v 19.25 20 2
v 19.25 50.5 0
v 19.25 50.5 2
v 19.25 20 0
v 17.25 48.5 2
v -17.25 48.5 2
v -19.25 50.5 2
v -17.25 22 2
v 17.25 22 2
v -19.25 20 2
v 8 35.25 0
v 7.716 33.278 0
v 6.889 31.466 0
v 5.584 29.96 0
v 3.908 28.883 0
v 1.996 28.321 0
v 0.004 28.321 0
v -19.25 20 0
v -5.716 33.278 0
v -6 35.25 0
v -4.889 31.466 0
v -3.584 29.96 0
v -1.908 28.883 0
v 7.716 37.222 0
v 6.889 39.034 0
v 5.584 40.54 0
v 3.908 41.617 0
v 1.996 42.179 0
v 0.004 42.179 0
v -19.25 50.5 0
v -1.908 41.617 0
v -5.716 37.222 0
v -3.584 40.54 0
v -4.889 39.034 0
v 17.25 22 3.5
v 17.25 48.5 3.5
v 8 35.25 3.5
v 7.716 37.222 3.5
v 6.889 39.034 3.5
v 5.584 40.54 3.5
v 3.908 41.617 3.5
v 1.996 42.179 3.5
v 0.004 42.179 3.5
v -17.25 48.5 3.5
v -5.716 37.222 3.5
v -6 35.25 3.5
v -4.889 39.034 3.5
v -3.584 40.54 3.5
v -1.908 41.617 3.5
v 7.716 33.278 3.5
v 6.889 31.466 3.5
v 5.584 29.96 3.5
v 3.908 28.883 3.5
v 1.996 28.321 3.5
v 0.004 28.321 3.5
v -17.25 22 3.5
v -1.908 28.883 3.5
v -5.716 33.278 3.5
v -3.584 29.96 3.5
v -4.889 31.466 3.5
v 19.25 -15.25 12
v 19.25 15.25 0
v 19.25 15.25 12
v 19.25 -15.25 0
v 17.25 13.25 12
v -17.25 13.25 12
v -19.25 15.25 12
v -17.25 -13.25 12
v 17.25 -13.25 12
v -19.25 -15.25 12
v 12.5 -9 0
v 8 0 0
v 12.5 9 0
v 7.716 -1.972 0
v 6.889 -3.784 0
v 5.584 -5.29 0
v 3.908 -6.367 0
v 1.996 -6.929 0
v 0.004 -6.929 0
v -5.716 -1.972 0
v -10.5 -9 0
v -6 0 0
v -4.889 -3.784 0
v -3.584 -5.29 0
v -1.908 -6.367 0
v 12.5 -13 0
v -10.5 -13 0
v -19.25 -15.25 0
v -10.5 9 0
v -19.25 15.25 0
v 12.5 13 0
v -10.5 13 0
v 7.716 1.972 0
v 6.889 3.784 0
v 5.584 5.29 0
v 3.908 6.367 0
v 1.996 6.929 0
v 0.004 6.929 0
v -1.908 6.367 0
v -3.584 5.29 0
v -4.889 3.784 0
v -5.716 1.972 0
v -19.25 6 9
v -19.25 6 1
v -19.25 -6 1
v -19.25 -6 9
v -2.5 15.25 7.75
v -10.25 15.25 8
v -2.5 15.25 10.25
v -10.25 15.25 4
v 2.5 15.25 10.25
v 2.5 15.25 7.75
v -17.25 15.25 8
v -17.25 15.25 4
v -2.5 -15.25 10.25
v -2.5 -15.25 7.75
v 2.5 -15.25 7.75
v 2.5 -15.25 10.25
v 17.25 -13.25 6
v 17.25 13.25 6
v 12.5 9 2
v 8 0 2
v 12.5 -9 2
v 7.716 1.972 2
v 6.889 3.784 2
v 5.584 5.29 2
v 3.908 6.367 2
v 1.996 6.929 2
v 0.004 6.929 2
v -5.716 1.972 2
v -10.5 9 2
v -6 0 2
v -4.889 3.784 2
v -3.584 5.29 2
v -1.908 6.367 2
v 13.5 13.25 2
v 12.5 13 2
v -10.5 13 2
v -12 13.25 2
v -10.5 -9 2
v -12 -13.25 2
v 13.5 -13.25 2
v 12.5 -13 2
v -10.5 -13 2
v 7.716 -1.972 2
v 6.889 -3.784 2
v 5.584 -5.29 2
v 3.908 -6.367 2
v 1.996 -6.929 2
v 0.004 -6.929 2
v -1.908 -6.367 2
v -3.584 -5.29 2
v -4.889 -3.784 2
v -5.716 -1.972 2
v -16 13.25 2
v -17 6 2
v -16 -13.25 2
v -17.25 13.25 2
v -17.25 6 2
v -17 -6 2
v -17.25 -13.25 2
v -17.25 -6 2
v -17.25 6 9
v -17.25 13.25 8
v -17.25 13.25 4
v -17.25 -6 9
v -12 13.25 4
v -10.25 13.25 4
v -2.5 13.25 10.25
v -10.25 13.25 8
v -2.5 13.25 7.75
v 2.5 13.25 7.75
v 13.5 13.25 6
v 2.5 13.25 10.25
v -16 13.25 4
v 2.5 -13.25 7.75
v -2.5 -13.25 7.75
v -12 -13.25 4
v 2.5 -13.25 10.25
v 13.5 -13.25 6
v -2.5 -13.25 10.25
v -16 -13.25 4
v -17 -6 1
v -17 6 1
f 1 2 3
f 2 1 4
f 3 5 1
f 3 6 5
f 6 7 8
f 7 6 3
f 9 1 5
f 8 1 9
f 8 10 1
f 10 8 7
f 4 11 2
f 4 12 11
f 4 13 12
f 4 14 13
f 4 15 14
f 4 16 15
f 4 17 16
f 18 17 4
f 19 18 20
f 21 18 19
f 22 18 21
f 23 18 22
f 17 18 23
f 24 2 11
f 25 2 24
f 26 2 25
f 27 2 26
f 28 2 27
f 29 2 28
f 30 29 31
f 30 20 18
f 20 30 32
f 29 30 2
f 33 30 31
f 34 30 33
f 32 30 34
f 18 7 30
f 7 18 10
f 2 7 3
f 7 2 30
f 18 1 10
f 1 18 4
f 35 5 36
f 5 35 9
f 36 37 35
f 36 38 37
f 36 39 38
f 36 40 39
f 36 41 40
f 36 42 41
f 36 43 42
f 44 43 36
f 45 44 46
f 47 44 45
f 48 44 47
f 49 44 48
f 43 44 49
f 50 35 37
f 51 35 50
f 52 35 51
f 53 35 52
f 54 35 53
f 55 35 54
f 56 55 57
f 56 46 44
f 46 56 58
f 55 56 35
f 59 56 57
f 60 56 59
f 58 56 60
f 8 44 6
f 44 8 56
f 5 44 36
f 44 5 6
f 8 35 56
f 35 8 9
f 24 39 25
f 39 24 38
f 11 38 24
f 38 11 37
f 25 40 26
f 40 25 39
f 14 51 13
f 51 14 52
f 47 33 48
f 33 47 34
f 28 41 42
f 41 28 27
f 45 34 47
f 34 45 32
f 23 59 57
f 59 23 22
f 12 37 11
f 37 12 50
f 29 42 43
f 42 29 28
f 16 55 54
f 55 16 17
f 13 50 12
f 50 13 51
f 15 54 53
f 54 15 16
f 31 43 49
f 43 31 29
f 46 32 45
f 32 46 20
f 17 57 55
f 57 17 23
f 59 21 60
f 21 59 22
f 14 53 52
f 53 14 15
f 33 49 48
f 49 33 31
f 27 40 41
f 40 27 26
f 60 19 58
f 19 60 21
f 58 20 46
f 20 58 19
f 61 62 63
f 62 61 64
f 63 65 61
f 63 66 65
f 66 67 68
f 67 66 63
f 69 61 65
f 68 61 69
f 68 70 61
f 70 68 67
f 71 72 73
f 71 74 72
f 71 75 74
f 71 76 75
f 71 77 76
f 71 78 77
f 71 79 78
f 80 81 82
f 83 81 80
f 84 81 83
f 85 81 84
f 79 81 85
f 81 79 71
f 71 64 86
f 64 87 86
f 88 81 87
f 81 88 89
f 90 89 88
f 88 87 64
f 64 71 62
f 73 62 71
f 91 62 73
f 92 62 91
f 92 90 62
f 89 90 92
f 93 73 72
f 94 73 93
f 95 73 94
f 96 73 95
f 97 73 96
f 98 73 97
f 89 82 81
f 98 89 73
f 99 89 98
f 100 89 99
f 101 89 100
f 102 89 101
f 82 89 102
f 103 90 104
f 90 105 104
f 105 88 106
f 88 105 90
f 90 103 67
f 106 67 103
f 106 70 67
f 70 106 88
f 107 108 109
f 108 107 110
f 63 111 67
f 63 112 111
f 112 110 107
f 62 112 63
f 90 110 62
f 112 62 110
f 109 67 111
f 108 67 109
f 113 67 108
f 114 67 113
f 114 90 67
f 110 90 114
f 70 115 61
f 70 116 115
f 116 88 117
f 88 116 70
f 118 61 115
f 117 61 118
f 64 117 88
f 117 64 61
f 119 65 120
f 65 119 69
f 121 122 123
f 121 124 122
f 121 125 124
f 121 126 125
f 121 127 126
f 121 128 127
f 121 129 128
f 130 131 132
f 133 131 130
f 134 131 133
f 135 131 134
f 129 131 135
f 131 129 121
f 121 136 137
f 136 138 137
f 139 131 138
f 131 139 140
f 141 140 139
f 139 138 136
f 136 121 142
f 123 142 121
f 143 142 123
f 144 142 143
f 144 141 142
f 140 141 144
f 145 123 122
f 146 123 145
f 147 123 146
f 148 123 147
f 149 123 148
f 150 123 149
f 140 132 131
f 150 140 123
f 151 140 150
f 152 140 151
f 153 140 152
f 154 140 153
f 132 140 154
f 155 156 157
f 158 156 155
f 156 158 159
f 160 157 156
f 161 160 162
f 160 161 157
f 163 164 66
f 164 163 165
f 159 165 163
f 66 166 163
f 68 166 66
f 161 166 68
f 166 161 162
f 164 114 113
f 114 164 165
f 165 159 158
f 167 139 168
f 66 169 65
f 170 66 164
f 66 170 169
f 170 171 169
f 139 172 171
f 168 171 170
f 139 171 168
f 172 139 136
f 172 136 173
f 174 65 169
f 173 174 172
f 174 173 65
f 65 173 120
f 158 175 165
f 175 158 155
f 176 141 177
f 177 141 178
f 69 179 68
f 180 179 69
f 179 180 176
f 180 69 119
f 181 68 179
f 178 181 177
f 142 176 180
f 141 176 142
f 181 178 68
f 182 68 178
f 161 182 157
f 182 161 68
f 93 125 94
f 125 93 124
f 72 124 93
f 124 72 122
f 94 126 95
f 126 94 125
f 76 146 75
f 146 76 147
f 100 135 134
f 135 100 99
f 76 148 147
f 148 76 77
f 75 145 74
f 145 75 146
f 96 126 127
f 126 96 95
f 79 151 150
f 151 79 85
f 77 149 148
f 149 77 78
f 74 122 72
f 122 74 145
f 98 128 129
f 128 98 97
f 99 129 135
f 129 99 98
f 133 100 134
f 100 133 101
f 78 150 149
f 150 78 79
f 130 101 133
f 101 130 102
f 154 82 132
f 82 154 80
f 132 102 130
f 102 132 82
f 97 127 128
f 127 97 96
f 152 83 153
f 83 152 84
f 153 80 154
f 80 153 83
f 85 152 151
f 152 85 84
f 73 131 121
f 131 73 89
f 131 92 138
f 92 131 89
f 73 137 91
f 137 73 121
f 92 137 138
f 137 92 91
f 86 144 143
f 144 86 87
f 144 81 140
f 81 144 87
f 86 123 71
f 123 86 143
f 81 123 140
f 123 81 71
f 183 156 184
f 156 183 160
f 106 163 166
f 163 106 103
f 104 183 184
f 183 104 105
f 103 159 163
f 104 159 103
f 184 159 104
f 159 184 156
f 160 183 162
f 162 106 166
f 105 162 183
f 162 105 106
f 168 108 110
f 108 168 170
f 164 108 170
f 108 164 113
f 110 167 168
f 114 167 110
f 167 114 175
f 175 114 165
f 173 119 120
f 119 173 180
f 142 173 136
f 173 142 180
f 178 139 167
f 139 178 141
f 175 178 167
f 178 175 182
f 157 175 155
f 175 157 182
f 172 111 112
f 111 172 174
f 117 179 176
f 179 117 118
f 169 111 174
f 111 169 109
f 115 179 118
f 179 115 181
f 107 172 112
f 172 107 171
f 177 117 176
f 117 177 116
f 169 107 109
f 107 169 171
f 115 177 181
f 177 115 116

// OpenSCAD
height = 12.0;

thickness = 2.0;
fudge = 0.1;

width = 38.5;
depth = 30.50;
 
cavity_width = width - (2 * thickness);
cavity_depth = depth - (2 * thickness);
cavity_height = height - thickness + fudge;

hole_diameter = 7.0;

slit_width = 4.0;
slit_height = 23.0;

// lid
difference() {
    union () {
        translate([-(width / 2.0), 20, 0.0]) cube([width, depth, 2.0]);
        translate([-(cavity_width / 2.0), 22, 2.0]) cube([cavity_width, cavity_depth, 1.5]);            
    }
    translate([1, 22 + (cavity_depth / 2), 2.5]) cylinder(h = 5 + fudge, r1 = hole_diameter, r2 =hole_diameter, center = true);
    // rotate([0, 0, 90]) translate([21.9, -12.5, 0]) cube([slit_width, slit_height, 10]);
    // rotate([0, 0, 90]) translate([44.6, -12.5, 0]) cube([slit_width, slit_height, 10]);
}

// base
difference() {
    union() {
        translate([13.5, -(cavity_depth / 2.0), 2]) cube([4.0, cavity_depth, 4.0]);
        translate([-16, -(cavity_depth / 2.0), 2]) cube([4.0, cavity_depth, 2.0]);
        difference () {
            translate([0, 0, height / 2.0]) cube([width, depth, height], center = true); 
            translate([0, 0, (cavity_height / 2.0) + thickness]) cube([cavity_width, cavity_depth, cavity_height], center = true);
            translate([1, 0, thickness / 2.0]) cylinder(h = thickness + fudge, r1 = hole_diameter, r2 = hole_diameter, center = true);
            rotate([0, 0, 90]) translate([9, -12.5, 0]) cube([slit_width, slit_height, 5]);
            rotate([0, 0, 90]) translate([-13, -12.5, 0]) cube([slit_width, slit_height, 5]);
            translate([-20, -6, 1]) cube([3, 12, 8]);
            translate([-17.25, 13.0, 4]) cube([7, 3, 4]);        
        }
    }
    translate([0,0,9])
    cube([5,35,2.5], center=true);
}
